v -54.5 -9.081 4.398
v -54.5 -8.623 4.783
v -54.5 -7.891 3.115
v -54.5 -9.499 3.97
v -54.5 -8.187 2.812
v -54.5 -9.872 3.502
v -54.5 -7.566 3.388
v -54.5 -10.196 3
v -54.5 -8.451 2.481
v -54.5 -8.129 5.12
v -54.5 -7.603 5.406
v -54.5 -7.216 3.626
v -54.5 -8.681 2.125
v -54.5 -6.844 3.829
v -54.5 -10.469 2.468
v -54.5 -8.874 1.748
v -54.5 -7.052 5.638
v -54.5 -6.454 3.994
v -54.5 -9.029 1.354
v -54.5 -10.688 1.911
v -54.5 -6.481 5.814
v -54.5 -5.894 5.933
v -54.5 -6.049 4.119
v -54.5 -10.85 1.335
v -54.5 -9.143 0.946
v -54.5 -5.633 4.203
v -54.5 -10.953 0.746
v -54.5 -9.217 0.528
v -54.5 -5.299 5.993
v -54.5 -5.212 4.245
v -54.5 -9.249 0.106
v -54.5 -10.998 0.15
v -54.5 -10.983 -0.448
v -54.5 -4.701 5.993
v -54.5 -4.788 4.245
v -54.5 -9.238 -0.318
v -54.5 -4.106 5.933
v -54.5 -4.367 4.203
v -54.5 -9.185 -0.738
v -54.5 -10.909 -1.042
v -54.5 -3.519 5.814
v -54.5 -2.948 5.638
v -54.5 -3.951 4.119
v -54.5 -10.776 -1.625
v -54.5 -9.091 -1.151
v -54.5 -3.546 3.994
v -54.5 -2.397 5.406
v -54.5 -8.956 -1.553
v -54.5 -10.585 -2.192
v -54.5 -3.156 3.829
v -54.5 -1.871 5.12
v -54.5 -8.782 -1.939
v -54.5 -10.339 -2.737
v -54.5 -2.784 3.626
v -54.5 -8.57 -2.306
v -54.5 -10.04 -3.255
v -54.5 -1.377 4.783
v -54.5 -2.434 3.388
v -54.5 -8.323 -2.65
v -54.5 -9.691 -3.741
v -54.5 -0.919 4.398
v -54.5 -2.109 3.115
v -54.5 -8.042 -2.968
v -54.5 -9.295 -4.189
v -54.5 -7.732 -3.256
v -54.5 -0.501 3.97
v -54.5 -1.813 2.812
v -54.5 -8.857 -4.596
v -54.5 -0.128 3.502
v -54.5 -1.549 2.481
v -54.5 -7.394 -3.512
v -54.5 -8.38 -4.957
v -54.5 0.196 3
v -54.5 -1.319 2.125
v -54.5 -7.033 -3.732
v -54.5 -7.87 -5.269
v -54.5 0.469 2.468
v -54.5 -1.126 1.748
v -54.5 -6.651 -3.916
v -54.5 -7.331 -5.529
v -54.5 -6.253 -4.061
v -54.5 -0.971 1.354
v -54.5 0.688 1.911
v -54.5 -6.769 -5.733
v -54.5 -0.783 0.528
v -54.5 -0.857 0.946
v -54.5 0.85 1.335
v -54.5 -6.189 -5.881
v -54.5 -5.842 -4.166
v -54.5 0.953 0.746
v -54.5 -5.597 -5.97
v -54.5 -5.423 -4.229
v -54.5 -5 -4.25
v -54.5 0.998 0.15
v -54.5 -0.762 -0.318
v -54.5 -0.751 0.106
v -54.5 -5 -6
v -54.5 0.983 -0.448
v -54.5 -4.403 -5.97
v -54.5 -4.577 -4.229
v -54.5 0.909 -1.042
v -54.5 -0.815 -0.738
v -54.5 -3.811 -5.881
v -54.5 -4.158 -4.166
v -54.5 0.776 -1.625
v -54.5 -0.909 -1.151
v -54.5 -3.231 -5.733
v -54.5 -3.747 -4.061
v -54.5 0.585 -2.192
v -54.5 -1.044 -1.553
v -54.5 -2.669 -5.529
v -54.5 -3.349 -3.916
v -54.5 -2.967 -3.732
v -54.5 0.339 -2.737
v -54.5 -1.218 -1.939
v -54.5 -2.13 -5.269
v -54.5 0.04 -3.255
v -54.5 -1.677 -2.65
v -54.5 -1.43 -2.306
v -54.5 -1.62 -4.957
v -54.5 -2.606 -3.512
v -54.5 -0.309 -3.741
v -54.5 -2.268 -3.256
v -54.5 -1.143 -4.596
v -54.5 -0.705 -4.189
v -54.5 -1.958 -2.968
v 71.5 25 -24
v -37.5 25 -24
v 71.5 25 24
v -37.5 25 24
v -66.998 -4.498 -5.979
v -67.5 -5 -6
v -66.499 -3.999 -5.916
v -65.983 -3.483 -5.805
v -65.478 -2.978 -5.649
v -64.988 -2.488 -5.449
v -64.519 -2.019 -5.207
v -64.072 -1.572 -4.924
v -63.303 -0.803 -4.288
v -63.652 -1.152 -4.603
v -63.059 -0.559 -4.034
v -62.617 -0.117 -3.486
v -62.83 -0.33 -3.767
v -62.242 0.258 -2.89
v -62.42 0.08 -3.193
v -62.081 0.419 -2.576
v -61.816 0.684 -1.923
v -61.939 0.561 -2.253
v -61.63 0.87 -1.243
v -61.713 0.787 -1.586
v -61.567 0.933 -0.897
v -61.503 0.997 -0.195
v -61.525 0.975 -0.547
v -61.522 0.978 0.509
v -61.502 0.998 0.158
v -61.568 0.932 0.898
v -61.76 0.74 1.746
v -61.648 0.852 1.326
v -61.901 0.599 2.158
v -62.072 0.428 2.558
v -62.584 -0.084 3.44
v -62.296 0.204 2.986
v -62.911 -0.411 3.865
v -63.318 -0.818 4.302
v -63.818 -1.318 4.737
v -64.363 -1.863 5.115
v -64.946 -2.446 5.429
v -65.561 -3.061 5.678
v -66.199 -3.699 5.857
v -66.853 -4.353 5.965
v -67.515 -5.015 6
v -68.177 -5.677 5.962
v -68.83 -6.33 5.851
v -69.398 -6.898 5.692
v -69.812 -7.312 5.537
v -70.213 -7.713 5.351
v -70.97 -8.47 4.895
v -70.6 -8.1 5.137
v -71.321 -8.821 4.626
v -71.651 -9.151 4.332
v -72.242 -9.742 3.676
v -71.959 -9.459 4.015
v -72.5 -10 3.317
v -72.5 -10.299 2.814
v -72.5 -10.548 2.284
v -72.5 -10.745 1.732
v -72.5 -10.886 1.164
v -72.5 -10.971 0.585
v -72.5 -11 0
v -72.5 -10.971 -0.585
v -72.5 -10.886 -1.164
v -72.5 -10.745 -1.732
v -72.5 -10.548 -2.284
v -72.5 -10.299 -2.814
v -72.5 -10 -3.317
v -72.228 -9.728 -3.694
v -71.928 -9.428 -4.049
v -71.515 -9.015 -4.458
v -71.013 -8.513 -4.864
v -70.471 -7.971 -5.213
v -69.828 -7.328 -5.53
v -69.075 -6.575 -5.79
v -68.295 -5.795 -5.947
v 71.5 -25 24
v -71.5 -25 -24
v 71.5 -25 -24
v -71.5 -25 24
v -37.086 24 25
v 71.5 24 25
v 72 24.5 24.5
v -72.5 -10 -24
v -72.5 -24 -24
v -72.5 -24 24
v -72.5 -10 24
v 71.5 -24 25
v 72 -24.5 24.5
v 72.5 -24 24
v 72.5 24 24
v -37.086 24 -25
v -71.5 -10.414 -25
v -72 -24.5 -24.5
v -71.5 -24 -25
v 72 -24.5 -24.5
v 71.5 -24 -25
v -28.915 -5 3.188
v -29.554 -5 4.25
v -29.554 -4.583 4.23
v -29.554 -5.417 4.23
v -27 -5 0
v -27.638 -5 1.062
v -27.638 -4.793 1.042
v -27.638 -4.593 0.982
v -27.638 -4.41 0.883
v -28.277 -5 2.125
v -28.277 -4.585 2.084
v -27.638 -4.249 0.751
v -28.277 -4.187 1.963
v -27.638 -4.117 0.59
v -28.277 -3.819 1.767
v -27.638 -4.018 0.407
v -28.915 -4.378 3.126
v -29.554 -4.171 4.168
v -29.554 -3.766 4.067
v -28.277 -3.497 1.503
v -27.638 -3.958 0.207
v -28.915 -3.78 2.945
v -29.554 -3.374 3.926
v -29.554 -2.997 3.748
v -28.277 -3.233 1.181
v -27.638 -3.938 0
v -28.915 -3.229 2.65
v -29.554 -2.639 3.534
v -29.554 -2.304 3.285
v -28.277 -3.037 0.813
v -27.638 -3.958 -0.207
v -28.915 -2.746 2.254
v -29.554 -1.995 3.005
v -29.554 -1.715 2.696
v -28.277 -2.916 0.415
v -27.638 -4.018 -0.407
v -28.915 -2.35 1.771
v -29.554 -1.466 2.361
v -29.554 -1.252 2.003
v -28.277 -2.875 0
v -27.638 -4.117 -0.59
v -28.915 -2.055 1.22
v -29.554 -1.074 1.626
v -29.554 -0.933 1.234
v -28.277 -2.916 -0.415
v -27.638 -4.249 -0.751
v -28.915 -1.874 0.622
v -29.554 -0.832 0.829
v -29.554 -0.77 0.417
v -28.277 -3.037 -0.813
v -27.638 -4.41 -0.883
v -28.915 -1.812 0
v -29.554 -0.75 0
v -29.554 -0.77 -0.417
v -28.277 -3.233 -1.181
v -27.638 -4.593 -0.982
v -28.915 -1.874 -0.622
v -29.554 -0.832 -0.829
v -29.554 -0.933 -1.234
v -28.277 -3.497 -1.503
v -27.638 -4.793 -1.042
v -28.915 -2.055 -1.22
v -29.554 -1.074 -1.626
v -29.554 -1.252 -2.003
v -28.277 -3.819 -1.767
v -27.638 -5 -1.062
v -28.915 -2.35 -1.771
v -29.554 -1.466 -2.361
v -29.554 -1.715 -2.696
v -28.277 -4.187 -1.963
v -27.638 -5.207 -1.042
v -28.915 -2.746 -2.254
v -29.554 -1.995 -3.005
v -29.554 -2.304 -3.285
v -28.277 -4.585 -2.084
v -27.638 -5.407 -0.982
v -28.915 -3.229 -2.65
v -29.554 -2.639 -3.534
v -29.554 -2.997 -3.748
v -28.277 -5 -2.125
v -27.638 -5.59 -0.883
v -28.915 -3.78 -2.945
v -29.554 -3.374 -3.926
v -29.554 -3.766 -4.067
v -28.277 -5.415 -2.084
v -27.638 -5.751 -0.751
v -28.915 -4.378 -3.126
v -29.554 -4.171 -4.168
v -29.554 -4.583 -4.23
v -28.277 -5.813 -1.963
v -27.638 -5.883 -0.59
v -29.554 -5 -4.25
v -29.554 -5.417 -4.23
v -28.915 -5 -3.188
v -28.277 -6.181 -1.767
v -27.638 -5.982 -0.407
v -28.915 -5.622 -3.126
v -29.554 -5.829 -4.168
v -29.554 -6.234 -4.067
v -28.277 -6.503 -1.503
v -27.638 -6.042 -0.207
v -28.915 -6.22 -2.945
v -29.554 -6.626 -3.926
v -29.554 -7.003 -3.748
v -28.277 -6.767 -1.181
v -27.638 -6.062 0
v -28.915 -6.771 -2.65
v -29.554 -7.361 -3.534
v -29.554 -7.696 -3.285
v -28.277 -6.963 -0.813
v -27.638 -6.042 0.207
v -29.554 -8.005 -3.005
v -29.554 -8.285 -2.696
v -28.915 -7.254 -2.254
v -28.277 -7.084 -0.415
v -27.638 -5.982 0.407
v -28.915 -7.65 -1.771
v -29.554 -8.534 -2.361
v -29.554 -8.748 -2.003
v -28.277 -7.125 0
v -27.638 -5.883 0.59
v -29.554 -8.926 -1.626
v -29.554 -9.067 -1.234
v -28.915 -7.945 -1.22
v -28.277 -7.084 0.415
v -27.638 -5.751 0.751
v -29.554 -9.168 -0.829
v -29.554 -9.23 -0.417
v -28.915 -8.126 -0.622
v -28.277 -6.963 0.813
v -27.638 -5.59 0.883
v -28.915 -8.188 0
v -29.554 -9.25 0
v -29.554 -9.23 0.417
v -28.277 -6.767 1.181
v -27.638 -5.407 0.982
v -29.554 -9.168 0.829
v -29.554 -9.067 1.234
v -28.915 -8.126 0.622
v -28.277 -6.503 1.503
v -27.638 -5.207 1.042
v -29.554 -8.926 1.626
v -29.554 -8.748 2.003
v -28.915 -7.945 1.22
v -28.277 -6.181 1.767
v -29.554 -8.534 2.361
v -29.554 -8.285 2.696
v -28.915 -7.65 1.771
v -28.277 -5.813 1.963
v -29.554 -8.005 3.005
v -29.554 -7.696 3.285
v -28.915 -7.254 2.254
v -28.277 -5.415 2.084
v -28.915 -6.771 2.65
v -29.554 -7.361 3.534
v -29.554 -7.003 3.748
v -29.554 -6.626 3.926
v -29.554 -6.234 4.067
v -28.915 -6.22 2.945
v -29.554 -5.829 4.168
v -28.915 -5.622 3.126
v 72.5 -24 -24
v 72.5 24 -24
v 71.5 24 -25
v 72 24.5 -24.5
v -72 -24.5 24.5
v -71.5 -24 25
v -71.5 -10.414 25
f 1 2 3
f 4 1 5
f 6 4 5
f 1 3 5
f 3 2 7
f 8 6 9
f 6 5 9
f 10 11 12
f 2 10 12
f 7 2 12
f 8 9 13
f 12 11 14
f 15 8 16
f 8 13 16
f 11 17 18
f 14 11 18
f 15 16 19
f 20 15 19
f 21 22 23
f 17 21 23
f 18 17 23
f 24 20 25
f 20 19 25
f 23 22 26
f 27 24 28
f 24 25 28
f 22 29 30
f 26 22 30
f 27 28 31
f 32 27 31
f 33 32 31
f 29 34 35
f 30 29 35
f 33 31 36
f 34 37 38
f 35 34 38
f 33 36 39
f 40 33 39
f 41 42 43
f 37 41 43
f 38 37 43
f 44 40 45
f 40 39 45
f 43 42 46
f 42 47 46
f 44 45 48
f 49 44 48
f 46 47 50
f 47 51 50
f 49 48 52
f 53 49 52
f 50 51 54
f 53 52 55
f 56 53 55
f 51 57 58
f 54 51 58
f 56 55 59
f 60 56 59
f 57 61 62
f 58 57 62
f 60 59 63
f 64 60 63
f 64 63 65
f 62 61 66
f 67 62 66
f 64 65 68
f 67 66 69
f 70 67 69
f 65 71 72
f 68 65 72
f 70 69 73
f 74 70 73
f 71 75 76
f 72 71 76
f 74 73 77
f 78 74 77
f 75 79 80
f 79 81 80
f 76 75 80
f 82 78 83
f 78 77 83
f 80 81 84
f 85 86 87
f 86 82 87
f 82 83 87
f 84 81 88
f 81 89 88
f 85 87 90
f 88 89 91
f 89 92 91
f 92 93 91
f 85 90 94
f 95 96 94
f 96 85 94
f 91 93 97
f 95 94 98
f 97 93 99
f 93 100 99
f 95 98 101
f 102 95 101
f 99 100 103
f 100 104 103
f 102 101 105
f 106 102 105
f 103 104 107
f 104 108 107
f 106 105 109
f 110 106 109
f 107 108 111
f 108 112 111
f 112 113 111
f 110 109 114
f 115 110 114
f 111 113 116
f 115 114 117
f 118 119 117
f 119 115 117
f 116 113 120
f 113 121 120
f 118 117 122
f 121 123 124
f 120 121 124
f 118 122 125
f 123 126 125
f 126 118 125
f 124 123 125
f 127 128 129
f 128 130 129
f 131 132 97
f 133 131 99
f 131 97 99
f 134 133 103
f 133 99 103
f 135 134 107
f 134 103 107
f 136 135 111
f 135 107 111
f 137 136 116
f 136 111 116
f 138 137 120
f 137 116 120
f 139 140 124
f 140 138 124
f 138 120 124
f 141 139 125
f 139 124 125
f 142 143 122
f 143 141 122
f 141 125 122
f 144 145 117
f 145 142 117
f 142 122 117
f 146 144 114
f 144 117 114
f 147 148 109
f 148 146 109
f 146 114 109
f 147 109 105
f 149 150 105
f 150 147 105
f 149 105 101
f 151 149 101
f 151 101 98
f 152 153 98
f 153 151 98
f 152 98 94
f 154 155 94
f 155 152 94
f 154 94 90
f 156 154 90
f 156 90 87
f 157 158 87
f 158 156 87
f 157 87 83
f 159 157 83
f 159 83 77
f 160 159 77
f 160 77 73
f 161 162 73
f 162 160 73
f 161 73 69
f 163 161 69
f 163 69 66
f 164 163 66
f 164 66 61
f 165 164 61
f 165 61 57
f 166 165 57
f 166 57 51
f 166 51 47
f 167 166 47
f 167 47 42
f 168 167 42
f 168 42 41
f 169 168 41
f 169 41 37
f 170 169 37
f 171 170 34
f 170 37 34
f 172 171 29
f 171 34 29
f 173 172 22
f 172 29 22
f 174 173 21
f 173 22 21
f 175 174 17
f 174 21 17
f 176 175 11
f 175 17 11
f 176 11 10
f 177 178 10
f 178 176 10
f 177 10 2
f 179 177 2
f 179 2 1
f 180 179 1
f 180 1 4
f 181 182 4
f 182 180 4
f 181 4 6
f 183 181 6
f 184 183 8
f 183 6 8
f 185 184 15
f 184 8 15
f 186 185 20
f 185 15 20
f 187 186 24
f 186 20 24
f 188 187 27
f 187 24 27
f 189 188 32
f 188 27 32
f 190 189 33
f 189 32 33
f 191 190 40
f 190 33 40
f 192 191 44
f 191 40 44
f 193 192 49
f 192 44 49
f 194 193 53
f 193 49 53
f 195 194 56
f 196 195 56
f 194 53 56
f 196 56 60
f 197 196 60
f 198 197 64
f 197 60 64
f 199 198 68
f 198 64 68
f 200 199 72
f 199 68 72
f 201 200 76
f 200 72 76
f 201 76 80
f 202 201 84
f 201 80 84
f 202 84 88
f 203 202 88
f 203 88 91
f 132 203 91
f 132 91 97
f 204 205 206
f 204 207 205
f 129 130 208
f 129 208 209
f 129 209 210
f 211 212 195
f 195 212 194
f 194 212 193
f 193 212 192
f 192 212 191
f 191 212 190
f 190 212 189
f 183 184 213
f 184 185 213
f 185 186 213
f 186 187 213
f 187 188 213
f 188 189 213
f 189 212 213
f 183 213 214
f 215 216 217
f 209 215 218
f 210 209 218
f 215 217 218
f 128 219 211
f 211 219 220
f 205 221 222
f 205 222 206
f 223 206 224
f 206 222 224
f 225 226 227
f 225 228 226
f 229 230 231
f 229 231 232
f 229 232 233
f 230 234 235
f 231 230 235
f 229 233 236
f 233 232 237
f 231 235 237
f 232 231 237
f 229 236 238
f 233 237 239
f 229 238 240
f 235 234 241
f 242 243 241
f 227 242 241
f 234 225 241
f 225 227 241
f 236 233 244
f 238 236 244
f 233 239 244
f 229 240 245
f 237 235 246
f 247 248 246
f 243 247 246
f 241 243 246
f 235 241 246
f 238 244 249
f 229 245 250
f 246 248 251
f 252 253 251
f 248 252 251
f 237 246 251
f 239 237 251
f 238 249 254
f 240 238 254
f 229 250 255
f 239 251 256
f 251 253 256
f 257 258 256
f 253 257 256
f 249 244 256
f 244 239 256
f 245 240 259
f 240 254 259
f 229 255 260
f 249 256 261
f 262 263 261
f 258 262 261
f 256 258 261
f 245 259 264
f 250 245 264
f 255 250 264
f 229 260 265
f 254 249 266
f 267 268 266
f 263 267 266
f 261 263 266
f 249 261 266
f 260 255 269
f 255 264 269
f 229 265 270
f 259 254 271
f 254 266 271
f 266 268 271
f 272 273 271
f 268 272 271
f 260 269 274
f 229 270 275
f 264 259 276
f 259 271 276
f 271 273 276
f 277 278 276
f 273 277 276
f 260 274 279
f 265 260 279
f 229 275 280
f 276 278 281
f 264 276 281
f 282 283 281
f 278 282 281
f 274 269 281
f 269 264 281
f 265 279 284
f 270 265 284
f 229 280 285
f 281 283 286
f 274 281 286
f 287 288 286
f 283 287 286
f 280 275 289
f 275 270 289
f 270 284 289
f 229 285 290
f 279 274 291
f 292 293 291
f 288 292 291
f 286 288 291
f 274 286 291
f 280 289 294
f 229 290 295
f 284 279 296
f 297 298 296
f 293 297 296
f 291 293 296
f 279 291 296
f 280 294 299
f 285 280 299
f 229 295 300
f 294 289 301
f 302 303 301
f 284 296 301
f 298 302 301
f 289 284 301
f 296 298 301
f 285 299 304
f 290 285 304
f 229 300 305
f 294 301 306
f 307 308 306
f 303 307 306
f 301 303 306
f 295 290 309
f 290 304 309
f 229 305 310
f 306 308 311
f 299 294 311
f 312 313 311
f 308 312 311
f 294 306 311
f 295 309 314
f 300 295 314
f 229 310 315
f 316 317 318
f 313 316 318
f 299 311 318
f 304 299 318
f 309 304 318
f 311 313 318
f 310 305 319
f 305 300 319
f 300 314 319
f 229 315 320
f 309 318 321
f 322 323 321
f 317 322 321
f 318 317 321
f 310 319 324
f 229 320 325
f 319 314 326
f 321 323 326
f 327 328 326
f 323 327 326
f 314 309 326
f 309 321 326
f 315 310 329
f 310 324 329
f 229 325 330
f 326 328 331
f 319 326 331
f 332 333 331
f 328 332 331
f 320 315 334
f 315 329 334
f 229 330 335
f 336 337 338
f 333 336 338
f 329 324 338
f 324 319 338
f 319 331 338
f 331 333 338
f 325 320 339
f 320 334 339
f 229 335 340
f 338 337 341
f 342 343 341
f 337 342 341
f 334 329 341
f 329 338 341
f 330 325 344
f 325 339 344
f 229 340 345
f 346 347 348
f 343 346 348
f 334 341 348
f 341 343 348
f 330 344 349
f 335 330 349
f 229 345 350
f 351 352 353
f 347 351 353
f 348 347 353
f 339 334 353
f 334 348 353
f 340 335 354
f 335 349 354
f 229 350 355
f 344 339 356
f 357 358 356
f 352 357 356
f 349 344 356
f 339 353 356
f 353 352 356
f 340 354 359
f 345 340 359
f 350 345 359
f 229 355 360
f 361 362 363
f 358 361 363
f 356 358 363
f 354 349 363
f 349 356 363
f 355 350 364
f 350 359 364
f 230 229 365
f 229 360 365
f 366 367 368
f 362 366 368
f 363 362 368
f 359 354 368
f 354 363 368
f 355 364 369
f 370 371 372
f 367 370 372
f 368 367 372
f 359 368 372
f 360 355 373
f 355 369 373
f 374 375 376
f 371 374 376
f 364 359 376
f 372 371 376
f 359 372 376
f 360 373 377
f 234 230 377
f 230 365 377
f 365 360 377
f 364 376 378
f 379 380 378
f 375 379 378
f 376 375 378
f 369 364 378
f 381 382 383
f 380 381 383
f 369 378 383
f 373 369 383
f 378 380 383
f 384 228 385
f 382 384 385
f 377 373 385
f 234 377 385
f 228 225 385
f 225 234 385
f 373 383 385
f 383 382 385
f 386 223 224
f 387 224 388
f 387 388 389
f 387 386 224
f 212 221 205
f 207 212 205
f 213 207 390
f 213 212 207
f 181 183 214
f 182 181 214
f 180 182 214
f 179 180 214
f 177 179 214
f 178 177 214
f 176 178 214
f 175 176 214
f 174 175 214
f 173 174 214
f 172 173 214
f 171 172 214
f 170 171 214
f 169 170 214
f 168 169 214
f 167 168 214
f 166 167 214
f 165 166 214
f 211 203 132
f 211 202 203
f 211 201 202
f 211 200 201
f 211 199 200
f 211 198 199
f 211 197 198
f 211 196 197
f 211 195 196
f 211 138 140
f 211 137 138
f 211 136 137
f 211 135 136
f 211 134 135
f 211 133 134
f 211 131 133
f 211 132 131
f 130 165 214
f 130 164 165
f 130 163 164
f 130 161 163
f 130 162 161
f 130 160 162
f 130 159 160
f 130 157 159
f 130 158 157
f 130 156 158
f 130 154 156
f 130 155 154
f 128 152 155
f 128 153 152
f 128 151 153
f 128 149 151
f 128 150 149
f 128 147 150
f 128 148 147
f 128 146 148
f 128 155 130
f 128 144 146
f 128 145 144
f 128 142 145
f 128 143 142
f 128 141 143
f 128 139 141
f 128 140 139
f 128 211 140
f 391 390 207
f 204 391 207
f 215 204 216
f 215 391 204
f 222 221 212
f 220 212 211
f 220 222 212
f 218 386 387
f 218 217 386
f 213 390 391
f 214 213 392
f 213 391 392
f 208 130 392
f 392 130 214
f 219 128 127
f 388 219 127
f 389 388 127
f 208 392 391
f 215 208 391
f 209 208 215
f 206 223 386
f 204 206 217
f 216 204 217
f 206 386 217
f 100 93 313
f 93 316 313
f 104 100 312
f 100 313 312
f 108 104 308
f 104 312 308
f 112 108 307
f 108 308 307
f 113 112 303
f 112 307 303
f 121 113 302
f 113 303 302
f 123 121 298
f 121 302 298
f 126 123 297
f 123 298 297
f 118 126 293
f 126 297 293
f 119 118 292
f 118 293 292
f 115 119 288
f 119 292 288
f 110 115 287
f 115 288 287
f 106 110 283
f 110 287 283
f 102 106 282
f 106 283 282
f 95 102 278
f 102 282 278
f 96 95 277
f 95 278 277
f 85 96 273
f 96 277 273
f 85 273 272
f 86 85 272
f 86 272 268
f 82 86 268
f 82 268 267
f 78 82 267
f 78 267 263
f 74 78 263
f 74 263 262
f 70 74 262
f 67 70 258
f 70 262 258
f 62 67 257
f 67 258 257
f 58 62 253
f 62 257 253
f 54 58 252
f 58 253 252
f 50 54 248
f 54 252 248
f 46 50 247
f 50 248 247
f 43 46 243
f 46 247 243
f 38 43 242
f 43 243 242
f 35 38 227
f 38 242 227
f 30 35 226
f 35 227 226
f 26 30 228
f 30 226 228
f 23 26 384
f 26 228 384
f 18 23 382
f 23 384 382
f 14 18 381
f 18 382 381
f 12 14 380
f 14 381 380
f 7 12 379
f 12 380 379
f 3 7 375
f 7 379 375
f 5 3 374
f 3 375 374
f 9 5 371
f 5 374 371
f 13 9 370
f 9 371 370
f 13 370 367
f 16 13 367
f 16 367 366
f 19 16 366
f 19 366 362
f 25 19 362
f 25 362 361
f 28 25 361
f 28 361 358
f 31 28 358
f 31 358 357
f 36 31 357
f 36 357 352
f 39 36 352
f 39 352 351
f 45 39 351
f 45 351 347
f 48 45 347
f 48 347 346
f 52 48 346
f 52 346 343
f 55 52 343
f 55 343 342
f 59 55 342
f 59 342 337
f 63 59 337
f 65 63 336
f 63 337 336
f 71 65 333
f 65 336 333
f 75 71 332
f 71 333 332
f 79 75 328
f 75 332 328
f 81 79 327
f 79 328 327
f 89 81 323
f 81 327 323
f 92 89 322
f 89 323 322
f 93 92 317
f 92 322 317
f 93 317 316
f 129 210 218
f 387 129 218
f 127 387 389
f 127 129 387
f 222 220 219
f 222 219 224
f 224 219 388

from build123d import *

# Parameters (mm, degrees)
SKETCH1_W                      = 145
SKETCH1_H                      = 50
BOSS_EXTRUDE1_DEPTH            = 25
CUT_EXTRUDE1_DEPTH             = 81.661329025
CUT_EXTRUDE1_DEPTH_BACK        = 81.661329025
F_12_0_12_DIAMETER_HOLE1_D     = 12
F_12_0_12_DIAMETER_HOLE1_DEPTH = 18
M10_TAPPED_HOLE2_D             = 8.5
M10_TAPPED_HOLE2_DEPTH         = 24.946342369
M10_TAPPED_HOLE2_TIP           = 2.553657631
CHAMFER1_SIZE                  = 1
CHAMFER2_SIZE                  = 1
CHAMFER3_SIZE                  = 1


with BuildPart() as part:
    # Sketch1 → Boss-Extrude1 (new, symmetric)
    with BuildSketch(Plane.XY):
        Rectangle(SKETCH1_W, SKETCH1_H)
    extrude(amount=BOSS_EXTRUDE1_DEPTH, both=True)

    # Sketch2 → Cut-Extrude1 (cut, two sides: drawn at the far end of the back side and taken through both)
    with BuildSketch(Plane.XY.offset(-CUT_EXTRUDE1_DEPTH_BACK)):
        Polygon((-72.5, -10), (-37.5, 25), (-72.5, 25), align=None)
    extrude(amount=CUT_EXTRUDE1_DEPTH + CUT_EXTRUDE1_DEPTH_BACK, mode=Mode.SUBTRACT)

    # Ø12.0 (12) Diameter Hole1
    with Locations(Plane.ZY.offset(72.5)):
        with Locations((0, -5)):
            Hole(F_12_0_12_DIAMETER_HOLE1_D / 2, depth=F_12_0_12_DIAMETER_HOLE1_DEPTH)

    # M10 Tapped Hole2
    with Locations(Plane.ZY.offset(54.5)):
        with Locations((0, -5)):
            Hole(M10_TAPPED_HOLE2_D / 2, depth=M10_TAPPED_HOLE2_DEPTH)
            with Locations((0, 0, -(M10_TAPPED_HOLE2_DEPTH + M10_TAPPED_HOLE2_TIP / 2))):  # 118° drill point
                Cone(0, M10_TAPPED_HOLE2_D / 2, M10_TAPPED_HOLE2_TIP, mode=Mode.SUBTRACT)

    # Chamfer1
    chamfer1_edges = [part.edges().sort_by_distance(p)[0] for p in [
        (-72.5, -17.5, -25),
        (-72.5, -17.5, 25),
        (0, -25, 25),
        (-55, 7.5, -25),
        (-55, 7.5, 25),
        (72.5, 0, 25),
        (0, -25, -25),
        (17.5, 25, -25),
        (72.5, 0, -25),
        (17.5, 25, 25),
    ]]
    chamfer(chamfer1_edges, length=CHAMFER1_SIZE)

    # Chamfer2
    chamfer2_edges = [part.edges().sort_by_distance(p)[0] for p in [
        (72.5, -25, 0),
        (72.5, 25, 0),
    ]]
    chamfer(chamfer2_edges, length=CHAMFER2_SIZE)

    # Chamfer3
    chamfer3_edges = [part.edges().sort_by_distance(p)[0] for p in [
        (-72.5, -25, 0),
    ]]
    chamfer(chamfer3_edges, length=CHAMFER3_SIZE)


solid = part.part
